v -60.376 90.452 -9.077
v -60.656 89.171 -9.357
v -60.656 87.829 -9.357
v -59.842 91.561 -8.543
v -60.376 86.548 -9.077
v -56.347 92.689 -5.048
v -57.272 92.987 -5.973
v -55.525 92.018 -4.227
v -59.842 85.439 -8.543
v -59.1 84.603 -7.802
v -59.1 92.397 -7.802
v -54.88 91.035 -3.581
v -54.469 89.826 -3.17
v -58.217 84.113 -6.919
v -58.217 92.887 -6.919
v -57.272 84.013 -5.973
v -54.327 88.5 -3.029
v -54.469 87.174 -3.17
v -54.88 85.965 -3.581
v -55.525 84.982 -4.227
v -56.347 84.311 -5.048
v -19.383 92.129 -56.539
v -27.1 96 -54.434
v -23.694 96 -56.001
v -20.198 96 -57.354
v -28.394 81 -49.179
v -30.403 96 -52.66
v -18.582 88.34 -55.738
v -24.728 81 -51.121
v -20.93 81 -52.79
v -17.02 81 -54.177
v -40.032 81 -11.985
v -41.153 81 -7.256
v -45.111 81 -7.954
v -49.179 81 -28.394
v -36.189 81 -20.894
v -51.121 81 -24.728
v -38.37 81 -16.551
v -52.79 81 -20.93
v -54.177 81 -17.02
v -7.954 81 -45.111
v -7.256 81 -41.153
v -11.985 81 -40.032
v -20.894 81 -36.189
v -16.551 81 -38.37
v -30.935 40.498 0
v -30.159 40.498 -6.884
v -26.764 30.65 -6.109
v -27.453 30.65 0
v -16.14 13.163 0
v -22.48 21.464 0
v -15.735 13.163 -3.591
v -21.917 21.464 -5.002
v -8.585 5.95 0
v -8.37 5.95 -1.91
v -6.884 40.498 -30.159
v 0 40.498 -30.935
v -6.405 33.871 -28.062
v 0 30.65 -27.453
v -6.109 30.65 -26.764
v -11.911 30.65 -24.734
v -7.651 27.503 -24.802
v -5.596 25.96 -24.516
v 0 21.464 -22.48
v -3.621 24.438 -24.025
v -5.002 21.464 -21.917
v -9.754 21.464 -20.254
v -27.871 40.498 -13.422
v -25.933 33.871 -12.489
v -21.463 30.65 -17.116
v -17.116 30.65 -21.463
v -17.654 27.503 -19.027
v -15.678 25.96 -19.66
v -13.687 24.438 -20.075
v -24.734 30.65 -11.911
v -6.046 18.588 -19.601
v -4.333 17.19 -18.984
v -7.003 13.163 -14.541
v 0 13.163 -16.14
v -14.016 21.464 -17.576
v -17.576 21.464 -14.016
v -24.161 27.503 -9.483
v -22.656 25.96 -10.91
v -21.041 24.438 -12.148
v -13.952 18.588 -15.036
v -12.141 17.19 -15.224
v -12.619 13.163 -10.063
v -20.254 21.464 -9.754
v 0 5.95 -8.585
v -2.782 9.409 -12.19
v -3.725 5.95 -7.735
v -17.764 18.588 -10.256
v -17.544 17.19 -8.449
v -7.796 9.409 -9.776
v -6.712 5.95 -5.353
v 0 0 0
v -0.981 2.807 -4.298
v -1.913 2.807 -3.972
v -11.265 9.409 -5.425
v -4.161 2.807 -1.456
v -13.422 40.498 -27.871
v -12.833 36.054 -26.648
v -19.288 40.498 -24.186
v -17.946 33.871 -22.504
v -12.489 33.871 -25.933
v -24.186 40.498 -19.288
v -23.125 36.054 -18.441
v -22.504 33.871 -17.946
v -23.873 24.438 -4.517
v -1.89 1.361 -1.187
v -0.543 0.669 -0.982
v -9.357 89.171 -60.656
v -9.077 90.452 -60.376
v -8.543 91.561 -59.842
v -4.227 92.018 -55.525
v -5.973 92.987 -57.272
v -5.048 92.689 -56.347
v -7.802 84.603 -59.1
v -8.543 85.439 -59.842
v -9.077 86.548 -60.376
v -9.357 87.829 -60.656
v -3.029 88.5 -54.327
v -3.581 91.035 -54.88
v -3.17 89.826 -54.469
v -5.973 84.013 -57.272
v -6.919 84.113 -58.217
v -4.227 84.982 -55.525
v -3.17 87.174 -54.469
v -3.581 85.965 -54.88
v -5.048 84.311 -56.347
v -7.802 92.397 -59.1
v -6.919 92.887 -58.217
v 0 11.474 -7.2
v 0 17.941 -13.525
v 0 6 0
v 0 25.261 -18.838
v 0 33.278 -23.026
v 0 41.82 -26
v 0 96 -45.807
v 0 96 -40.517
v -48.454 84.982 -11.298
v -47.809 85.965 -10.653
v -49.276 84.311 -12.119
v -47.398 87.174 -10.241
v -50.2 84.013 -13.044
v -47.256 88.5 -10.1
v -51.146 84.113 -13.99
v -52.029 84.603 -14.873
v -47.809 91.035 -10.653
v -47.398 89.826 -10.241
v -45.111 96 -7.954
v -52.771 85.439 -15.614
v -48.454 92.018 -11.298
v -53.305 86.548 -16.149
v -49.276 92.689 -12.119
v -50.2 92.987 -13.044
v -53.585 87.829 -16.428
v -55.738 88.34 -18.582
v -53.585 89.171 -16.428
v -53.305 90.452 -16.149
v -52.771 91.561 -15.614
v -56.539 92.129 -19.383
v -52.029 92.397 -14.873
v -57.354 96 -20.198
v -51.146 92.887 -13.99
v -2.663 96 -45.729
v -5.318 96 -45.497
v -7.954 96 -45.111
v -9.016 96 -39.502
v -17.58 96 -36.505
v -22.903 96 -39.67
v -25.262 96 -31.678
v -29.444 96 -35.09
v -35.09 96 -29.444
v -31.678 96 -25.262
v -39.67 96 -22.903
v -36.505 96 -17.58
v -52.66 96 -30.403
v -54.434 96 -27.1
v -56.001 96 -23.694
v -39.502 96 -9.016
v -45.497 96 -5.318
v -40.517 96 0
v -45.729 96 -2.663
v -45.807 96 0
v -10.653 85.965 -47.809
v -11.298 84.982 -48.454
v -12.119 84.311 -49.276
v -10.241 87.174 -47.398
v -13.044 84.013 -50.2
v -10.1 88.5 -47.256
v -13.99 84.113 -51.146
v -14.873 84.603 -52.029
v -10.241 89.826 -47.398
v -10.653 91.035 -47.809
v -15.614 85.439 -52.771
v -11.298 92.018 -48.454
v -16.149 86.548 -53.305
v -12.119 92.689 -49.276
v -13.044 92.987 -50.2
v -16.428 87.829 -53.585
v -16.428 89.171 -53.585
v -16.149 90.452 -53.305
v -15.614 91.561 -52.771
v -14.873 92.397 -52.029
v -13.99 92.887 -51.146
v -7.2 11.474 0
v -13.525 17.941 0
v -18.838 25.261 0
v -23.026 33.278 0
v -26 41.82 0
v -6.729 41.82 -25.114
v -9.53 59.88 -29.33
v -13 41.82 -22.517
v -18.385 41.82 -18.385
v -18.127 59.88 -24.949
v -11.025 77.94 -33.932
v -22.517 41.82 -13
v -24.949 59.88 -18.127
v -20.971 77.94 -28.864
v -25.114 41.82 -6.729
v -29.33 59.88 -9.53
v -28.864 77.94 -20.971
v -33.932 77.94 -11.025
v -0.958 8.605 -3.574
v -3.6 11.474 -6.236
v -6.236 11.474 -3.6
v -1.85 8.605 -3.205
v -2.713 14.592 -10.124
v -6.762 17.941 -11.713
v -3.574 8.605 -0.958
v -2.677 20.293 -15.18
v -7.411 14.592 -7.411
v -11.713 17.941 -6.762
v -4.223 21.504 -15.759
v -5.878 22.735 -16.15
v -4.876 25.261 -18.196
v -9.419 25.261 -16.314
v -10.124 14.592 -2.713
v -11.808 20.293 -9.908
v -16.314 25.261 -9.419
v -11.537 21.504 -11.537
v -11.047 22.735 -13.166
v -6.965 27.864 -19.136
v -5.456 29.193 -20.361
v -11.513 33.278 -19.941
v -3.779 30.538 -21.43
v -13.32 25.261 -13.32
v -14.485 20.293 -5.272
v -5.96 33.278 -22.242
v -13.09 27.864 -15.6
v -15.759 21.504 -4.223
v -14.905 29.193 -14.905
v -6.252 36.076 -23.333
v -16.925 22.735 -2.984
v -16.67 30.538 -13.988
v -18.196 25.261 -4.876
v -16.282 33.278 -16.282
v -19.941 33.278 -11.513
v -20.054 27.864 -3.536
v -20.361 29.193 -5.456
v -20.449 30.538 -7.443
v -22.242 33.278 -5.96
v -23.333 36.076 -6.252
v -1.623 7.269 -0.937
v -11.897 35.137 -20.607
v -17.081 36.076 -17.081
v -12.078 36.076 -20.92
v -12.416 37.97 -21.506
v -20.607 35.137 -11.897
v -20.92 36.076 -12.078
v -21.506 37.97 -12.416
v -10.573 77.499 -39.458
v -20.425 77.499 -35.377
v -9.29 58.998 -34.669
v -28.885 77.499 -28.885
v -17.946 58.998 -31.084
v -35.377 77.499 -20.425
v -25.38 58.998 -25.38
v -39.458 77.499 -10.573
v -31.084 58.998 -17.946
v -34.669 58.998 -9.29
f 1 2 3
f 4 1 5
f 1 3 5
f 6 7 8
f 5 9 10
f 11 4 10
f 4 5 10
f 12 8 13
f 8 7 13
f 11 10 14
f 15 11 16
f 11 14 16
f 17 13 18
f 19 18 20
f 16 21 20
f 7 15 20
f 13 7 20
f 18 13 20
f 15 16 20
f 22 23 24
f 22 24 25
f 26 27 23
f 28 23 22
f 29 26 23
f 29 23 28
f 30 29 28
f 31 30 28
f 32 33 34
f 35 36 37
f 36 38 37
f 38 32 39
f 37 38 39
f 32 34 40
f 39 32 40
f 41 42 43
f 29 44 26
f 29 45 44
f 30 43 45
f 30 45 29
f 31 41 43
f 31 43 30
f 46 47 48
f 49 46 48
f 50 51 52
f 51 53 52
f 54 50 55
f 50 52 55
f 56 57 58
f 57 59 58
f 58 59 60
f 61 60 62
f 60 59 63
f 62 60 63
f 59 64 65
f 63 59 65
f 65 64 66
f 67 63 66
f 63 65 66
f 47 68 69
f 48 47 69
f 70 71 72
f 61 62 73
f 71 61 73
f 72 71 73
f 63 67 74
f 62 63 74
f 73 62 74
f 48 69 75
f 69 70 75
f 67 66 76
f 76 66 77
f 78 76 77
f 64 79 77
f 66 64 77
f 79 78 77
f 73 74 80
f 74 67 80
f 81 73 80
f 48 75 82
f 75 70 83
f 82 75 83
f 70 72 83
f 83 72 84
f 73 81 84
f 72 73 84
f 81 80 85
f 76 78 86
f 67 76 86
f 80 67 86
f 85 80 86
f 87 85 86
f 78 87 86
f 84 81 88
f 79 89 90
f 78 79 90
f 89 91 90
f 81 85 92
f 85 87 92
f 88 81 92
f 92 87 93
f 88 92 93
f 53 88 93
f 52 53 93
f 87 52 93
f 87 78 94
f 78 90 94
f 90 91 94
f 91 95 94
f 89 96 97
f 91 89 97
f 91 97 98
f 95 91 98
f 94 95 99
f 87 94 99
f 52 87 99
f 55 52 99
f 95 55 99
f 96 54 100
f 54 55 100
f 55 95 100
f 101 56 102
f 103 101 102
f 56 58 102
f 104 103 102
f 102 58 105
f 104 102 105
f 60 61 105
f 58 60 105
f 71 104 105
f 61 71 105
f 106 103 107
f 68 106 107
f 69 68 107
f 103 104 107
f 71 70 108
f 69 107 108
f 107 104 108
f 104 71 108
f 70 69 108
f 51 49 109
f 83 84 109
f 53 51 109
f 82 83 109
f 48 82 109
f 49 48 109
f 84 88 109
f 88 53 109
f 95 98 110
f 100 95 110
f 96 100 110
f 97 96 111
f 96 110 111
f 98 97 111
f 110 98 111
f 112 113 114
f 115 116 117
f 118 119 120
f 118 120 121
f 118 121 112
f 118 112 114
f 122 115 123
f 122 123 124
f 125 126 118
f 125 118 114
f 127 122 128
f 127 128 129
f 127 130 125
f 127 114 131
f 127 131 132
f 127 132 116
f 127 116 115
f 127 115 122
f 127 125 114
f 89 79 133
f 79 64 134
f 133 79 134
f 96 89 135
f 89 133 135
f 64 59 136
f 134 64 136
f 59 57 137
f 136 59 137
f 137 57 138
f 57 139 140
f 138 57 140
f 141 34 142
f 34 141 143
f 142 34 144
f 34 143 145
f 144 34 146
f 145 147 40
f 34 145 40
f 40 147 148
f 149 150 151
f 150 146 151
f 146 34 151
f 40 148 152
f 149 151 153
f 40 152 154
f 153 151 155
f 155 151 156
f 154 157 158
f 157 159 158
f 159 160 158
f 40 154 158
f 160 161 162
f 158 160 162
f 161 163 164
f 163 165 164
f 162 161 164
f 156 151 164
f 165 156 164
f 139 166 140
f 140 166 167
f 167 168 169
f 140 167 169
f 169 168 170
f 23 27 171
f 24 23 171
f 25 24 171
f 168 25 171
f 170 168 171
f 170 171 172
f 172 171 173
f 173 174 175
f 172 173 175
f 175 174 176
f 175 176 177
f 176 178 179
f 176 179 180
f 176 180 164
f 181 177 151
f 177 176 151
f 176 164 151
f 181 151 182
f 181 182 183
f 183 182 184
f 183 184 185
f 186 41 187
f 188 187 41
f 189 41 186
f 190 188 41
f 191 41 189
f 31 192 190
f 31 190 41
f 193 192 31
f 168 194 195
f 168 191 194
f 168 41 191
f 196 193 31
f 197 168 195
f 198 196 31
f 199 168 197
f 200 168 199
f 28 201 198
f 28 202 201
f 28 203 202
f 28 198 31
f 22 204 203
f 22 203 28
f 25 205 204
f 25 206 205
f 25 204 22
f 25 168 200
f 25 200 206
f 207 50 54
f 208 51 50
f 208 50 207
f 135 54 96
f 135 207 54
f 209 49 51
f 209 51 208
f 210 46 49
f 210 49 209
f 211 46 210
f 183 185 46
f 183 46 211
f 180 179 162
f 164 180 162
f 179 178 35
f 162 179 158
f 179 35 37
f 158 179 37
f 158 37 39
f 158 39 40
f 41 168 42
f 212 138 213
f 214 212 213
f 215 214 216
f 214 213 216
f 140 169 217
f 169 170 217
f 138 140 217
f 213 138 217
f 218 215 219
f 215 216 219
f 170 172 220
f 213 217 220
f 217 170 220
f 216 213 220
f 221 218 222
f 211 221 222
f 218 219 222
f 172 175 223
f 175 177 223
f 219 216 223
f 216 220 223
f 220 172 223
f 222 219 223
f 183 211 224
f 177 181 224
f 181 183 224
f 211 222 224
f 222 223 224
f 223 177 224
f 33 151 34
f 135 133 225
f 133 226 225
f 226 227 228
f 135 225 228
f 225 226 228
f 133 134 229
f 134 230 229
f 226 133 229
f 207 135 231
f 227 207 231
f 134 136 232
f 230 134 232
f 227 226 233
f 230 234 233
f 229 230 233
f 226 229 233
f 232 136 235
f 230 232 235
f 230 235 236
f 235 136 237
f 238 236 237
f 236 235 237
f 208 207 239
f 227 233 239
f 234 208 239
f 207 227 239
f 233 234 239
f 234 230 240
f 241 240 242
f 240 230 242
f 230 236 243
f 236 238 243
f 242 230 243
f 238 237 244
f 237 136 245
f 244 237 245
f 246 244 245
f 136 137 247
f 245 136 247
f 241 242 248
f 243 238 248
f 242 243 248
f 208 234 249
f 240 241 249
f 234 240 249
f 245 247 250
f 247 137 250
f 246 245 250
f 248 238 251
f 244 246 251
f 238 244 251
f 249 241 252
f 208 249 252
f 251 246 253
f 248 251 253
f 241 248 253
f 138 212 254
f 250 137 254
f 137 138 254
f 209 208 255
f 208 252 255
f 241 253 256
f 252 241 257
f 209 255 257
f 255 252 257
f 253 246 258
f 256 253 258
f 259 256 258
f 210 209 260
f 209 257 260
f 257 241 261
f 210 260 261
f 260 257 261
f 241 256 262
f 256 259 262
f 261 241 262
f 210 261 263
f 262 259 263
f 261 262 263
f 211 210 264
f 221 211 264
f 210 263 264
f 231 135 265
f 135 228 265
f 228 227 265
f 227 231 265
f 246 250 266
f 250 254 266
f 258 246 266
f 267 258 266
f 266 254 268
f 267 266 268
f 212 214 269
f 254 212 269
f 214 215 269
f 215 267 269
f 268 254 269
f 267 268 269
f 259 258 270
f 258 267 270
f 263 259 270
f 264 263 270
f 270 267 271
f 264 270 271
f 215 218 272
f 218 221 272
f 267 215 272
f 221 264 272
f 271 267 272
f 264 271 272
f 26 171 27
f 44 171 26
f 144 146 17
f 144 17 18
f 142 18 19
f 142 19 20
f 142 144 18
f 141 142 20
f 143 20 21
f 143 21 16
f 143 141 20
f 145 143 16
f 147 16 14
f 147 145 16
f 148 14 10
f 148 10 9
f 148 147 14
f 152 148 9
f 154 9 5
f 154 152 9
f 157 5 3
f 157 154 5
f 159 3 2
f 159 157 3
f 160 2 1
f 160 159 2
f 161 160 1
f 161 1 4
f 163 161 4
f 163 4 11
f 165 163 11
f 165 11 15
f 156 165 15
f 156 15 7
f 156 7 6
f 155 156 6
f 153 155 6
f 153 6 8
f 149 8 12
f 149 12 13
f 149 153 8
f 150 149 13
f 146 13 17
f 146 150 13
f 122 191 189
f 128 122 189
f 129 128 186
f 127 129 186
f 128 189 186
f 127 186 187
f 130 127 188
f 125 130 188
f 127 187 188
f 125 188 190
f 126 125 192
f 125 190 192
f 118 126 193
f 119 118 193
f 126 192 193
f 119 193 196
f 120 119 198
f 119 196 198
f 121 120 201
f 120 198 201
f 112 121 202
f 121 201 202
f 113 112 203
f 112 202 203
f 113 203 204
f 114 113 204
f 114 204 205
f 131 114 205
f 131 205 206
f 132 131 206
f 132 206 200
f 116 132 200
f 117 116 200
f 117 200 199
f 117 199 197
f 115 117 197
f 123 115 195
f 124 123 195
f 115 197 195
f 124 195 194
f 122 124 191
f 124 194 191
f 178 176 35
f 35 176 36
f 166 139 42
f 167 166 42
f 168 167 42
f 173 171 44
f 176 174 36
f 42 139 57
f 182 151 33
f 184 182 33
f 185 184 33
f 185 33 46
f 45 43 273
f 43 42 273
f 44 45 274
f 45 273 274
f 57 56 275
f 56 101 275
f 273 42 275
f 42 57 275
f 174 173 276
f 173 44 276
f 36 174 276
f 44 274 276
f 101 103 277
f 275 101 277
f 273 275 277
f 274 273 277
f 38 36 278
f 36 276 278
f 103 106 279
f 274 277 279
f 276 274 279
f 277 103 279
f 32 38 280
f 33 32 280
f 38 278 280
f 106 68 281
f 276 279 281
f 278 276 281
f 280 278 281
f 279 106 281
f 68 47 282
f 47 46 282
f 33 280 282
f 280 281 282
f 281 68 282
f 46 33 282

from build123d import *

# Parameters (mm, degrees)
REVOLUCI_N1_ANGLE       = 90
REVOLUCI_N2_ANGLE       = 20
REVOLUCI_N3_ANGLE       = 20
CORTAR_EXTRUIR1_DEPTH   = 129.015444104
CROQUIS13_R             = 4.5
SALIENTE_EXTRUIR1_DEPTH = 10


with BuildPart() as part:
    # Croquis2 → Revolución1 (revolve)
    with BuildSketch(Plane(origin=(0, 0, 0), x_dir=(0, 0, -1), z_dir=(1, 0, 0))):
        with BuildLine():
            Line((0, 0), (0, 6))
            ThreePointArc((0, 6), (16.315231643, 21.503634207), (26, 41.82))
            Line((26, 41.82), (40.517487246, 96))
            Line((40.517487246, 96), (45.806819571, 96))
            Line((45.806819571, 96), (30.935014244, 40.497666919))
            ThreePointArc((30.935014244, 40.497666919), (19.472326357, 17.189666117), (0, 0))
        make_face()
    revolve(axis=Axis((0, 0, 0), (0, 1, 0)), revolution_arc=REVOLUCI_N1_ANGLE)

    # Croquis10 → Revolución2 (revolve)
    with BuildSketch(Plane(origin=(0, 0, 0), x_dir=(0, 1, 0), z_dir=(0.866025403784438, 0, -0.500000000000001))):
        Polygon((81, -41.787581685), (96, -45.806819571), (96, -60.806819571), (81, -56.787581685), align=None)
    revolve(axis=Axis((0, 0, 0), (0, -1, 0)), revolution_arc=REVOLUCI_N2_ANGLE)

    # Croquis11 → Revolución3 (revolve)
    with BuildSketch(Plane(origin=(0, 0, 0), x_dir=(0, 1, 0), z_dir=(0.499999999999998, 1.4337406519976025e-15, -0.8660254037844398))):
        Polygon((96, -45.806819571), (96, -60.806819571), (81, -56.787581685), (81, -41.787581685), align=None)
    revolve(axis=Axis((0, 0, 0), (0, 1, 0)), revolution_arc=REVOLUCI_N3_ANGLE)

    # Croquis12 → Cortar-Extruir1 (cut, through all)
    with BuildSketch(Plane(origin=(0, 96, 0), x_dir=(1, 0, 0), z_dir=(0, 1, 0))):
        with BuildLine():
            Line((-7.954270743, 45.110911055), (-20.197712047, 57.354352358))
            ThreePointArc((-20.197712047, 57.354352358), (-15.430239205, 58.81646899), (-10.558993408, 59.88302735))
            Line((-10.558993408, 59.88302735), (-7.954270743, 45.110911055))
        make_face()
        with BuildLine():
            Line((-45.110911055, 7.954270743), (-57.354352358, 20.197712047))
            ThreePointArc((-57.354352358, 20.197712047), (-58.81646899, 15.430239205), (-59.88302735, 10.558993408))
            Line((-59.88302735, 10.558993408), (-45.110911055, 7.954270743))
        make_face()
    extrude(amount=-CORTAR_EXTRUIR1_DEPTH, mode=Mode.SUBTRACT)

    # Croquis13 → Saliente-Extruir1 (add)
    with BuildSketch(Plane(origin=(18.578320156, 0, -18.578320156), x_dir=(-0.7071067811865489, 0, -0.7071067811865461), z_dir=(0.7071067811865461, 0, -0.7071067811865489))):
        with Locations(Location((45.056780398, 88.5, 0), (0, 0, 180))):
            Circle(CROQUIS13_R)
    saliente_extruir1 = extrude(amount=SALIENTE_EXTRUIR1_DEPTH)

    # Simetría1: Saliente-Extruir1 across plane
    add(saliente_extruir1.mirror(Plane(origin=(0, 0, 0), x_dir=(0.7071067811865488, 1.170644340293136e-15, 0.7071067811865464), z_dir=(0.7071067811865462, 1.1706443402931319e-15, -0.7071067811865488))))


solid = part.part
